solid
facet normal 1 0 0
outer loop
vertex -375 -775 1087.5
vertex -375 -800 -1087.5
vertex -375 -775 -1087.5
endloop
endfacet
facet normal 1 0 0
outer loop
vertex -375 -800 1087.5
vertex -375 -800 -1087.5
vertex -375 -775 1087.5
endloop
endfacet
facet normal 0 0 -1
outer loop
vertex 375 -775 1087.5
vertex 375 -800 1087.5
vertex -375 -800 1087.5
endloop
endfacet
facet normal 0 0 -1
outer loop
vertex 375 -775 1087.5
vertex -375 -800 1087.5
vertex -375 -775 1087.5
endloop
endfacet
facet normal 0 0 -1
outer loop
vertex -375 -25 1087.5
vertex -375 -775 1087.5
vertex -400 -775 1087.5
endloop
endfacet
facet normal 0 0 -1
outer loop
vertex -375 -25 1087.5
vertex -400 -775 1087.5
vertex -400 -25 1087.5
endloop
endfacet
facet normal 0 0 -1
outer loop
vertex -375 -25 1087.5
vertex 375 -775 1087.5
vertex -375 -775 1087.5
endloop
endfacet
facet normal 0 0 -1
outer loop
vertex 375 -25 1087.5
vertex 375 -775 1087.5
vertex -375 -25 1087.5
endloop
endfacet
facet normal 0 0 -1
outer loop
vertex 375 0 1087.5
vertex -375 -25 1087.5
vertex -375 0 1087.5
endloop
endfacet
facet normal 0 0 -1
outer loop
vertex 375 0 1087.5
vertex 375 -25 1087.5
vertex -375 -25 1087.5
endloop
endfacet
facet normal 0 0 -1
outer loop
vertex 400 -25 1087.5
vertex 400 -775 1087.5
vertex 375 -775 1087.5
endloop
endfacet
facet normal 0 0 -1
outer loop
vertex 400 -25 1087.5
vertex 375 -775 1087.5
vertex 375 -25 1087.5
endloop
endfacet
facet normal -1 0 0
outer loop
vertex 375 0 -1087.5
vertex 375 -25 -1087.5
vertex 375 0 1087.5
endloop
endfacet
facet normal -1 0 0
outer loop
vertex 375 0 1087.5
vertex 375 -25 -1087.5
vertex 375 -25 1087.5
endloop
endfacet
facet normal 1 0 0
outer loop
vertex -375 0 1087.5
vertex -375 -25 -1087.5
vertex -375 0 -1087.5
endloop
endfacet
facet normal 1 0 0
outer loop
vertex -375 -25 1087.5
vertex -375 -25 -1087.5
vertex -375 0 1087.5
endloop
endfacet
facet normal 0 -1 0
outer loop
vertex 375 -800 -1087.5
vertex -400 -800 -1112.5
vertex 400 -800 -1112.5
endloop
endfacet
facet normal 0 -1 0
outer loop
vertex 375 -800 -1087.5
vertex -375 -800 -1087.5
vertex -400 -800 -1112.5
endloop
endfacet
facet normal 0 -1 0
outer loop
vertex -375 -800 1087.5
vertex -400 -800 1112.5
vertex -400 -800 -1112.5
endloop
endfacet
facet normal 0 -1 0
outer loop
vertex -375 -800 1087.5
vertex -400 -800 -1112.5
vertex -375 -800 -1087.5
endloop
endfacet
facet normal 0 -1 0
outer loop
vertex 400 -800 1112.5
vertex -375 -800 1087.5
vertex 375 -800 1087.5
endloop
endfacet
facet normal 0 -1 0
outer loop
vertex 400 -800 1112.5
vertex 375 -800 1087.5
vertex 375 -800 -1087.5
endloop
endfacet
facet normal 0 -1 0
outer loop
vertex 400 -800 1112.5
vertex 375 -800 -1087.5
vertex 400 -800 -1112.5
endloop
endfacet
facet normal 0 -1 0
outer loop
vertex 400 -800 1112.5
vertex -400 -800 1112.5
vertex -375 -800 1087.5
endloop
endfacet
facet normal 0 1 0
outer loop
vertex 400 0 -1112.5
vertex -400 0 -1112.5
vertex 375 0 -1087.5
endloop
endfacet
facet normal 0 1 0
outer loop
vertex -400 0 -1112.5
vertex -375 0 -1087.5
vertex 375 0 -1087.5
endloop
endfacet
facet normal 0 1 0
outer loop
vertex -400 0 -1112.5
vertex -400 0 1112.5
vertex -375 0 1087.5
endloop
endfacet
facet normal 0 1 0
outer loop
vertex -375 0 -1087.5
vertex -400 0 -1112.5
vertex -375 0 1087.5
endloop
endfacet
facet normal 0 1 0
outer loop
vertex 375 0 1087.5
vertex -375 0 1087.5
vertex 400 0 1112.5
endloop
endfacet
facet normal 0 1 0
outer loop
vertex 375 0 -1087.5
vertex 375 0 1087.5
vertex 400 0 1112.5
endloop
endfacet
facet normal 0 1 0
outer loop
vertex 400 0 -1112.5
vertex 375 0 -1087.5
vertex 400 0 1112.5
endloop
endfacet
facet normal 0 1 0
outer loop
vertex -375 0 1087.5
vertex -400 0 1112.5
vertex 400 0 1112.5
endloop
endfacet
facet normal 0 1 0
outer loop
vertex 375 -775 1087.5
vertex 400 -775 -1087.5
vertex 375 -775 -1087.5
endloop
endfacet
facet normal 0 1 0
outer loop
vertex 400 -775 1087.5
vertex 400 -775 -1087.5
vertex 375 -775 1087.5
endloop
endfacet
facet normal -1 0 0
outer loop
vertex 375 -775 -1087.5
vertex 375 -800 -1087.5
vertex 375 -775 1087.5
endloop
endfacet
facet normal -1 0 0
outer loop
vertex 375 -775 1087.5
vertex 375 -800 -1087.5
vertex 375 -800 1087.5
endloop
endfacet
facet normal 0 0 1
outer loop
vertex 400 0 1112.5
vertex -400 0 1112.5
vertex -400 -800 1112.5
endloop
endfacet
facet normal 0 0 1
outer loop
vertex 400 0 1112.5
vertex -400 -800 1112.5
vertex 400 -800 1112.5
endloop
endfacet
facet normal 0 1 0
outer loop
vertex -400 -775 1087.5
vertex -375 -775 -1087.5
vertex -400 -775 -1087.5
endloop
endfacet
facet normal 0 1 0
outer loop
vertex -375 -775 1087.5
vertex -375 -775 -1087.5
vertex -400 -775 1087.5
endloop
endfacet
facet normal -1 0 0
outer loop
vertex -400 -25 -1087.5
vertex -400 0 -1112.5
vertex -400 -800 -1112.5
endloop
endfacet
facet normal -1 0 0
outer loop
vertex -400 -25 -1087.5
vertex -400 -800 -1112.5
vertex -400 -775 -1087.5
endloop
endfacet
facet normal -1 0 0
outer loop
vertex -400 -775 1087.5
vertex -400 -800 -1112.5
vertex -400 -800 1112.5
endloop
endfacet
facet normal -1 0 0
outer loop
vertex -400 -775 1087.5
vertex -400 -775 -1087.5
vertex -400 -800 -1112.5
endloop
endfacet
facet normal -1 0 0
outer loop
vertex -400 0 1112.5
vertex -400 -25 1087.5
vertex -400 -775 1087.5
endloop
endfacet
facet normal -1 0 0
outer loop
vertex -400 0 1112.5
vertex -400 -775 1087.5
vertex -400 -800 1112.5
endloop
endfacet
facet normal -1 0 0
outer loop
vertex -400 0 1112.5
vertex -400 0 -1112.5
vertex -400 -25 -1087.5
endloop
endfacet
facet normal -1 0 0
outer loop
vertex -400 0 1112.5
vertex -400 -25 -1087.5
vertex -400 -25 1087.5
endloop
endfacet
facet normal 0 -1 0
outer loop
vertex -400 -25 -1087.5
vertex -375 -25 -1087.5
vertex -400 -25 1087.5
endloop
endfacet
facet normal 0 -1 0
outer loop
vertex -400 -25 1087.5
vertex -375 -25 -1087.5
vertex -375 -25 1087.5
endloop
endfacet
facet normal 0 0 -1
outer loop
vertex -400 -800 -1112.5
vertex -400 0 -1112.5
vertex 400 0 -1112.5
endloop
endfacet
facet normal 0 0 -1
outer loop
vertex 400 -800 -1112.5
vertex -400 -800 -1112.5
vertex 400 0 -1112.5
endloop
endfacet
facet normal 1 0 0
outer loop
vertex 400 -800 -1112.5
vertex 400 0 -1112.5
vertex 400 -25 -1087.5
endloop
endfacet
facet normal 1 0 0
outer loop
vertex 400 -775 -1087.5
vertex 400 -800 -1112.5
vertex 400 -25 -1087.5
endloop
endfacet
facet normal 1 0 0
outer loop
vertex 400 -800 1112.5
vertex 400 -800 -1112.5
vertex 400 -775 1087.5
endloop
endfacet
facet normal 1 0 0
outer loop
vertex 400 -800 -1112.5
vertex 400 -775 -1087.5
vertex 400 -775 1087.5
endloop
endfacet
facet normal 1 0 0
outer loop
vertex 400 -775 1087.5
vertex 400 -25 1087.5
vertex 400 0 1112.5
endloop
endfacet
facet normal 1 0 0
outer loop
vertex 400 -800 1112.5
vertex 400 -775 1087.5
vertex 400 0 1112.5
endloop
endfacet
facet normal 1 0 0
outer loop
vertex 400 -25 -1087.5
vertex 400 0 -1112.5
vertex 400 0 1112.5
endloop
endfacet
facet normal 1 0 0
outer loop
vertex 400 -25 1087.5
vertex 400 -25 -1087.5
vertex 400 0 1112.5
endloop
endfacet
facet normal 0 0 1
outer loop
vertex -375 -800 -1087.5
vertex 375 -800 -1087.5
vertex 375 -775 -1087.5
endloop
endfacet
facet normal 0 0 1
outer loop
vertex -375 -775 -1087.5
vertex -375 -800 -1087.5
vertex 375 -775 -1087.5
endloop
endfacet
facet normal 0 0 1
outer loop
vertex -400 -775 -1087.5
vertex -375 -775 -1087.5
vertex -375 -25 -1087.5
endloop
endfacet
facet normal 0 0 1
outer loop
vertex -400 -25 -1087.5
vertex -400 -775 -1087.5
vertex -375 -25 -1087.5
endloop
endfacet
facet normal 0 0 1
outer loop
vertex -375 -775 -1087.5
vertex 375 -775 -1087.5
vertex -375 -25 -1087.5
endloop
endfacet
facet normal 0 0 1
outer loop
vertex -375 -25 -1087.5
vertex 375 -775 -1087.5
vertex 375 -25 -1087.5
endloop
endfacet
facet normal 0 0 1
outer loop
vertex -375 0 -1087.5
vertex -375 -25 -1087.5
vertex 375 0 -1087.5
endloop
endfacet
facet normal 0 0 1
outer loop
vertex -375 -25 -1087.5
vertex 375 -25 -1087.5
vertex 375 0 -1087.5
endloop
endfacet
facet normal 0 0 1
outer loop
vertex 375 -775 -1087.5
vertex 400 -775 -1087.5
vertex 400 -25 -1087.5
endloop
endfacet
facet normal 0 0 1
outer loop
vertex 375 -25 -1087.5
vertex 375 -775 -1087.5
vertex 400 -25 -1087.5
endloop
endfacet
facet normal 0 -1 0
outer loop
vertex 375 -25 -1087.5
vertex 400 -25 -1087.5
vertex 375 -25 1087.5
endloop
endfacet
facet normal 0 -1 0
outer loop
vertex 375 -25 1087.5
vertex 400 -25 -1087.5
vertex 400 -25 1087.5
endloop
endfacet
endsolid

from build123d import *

# Parameters (mm, degrees)
F0_W     = 800
F0_H     = 2225
F1_DEPTH = 800
F2_W     = 750
F2_H     = 2175
F3_DEPTH = 800
F4_W     = 750
F4_H     = 2175
F5_DEPTH = 800


with BuildPart() as f1:
    # F0 (on Front) → F1 (new body)
    with BuildSketch(Plane.XZ):
        Rectangle(F0_W, F0_H)
    extrude(amount=F1_DEPTH)

    # F2 (on face) → F3 (cut, through all)
    with BuildSketch(Plane.XZ.offset(800)):
        Rectangle(F2_W, F2_H)
    extrude(amount=-F3_DEPTH, mode=Mode.SUBTRACT)

    # F4 (on face) → F5 (cut, through all)
    with BuildSketch(Plane.YZ.offset(400)):
        with Locations((-400, 0)):
            Rectangle(F4_W, F4_H)
    extrude(amount=-F5_DEPTH, mode=Mode.SUBTRACT)


solid = f1.part
